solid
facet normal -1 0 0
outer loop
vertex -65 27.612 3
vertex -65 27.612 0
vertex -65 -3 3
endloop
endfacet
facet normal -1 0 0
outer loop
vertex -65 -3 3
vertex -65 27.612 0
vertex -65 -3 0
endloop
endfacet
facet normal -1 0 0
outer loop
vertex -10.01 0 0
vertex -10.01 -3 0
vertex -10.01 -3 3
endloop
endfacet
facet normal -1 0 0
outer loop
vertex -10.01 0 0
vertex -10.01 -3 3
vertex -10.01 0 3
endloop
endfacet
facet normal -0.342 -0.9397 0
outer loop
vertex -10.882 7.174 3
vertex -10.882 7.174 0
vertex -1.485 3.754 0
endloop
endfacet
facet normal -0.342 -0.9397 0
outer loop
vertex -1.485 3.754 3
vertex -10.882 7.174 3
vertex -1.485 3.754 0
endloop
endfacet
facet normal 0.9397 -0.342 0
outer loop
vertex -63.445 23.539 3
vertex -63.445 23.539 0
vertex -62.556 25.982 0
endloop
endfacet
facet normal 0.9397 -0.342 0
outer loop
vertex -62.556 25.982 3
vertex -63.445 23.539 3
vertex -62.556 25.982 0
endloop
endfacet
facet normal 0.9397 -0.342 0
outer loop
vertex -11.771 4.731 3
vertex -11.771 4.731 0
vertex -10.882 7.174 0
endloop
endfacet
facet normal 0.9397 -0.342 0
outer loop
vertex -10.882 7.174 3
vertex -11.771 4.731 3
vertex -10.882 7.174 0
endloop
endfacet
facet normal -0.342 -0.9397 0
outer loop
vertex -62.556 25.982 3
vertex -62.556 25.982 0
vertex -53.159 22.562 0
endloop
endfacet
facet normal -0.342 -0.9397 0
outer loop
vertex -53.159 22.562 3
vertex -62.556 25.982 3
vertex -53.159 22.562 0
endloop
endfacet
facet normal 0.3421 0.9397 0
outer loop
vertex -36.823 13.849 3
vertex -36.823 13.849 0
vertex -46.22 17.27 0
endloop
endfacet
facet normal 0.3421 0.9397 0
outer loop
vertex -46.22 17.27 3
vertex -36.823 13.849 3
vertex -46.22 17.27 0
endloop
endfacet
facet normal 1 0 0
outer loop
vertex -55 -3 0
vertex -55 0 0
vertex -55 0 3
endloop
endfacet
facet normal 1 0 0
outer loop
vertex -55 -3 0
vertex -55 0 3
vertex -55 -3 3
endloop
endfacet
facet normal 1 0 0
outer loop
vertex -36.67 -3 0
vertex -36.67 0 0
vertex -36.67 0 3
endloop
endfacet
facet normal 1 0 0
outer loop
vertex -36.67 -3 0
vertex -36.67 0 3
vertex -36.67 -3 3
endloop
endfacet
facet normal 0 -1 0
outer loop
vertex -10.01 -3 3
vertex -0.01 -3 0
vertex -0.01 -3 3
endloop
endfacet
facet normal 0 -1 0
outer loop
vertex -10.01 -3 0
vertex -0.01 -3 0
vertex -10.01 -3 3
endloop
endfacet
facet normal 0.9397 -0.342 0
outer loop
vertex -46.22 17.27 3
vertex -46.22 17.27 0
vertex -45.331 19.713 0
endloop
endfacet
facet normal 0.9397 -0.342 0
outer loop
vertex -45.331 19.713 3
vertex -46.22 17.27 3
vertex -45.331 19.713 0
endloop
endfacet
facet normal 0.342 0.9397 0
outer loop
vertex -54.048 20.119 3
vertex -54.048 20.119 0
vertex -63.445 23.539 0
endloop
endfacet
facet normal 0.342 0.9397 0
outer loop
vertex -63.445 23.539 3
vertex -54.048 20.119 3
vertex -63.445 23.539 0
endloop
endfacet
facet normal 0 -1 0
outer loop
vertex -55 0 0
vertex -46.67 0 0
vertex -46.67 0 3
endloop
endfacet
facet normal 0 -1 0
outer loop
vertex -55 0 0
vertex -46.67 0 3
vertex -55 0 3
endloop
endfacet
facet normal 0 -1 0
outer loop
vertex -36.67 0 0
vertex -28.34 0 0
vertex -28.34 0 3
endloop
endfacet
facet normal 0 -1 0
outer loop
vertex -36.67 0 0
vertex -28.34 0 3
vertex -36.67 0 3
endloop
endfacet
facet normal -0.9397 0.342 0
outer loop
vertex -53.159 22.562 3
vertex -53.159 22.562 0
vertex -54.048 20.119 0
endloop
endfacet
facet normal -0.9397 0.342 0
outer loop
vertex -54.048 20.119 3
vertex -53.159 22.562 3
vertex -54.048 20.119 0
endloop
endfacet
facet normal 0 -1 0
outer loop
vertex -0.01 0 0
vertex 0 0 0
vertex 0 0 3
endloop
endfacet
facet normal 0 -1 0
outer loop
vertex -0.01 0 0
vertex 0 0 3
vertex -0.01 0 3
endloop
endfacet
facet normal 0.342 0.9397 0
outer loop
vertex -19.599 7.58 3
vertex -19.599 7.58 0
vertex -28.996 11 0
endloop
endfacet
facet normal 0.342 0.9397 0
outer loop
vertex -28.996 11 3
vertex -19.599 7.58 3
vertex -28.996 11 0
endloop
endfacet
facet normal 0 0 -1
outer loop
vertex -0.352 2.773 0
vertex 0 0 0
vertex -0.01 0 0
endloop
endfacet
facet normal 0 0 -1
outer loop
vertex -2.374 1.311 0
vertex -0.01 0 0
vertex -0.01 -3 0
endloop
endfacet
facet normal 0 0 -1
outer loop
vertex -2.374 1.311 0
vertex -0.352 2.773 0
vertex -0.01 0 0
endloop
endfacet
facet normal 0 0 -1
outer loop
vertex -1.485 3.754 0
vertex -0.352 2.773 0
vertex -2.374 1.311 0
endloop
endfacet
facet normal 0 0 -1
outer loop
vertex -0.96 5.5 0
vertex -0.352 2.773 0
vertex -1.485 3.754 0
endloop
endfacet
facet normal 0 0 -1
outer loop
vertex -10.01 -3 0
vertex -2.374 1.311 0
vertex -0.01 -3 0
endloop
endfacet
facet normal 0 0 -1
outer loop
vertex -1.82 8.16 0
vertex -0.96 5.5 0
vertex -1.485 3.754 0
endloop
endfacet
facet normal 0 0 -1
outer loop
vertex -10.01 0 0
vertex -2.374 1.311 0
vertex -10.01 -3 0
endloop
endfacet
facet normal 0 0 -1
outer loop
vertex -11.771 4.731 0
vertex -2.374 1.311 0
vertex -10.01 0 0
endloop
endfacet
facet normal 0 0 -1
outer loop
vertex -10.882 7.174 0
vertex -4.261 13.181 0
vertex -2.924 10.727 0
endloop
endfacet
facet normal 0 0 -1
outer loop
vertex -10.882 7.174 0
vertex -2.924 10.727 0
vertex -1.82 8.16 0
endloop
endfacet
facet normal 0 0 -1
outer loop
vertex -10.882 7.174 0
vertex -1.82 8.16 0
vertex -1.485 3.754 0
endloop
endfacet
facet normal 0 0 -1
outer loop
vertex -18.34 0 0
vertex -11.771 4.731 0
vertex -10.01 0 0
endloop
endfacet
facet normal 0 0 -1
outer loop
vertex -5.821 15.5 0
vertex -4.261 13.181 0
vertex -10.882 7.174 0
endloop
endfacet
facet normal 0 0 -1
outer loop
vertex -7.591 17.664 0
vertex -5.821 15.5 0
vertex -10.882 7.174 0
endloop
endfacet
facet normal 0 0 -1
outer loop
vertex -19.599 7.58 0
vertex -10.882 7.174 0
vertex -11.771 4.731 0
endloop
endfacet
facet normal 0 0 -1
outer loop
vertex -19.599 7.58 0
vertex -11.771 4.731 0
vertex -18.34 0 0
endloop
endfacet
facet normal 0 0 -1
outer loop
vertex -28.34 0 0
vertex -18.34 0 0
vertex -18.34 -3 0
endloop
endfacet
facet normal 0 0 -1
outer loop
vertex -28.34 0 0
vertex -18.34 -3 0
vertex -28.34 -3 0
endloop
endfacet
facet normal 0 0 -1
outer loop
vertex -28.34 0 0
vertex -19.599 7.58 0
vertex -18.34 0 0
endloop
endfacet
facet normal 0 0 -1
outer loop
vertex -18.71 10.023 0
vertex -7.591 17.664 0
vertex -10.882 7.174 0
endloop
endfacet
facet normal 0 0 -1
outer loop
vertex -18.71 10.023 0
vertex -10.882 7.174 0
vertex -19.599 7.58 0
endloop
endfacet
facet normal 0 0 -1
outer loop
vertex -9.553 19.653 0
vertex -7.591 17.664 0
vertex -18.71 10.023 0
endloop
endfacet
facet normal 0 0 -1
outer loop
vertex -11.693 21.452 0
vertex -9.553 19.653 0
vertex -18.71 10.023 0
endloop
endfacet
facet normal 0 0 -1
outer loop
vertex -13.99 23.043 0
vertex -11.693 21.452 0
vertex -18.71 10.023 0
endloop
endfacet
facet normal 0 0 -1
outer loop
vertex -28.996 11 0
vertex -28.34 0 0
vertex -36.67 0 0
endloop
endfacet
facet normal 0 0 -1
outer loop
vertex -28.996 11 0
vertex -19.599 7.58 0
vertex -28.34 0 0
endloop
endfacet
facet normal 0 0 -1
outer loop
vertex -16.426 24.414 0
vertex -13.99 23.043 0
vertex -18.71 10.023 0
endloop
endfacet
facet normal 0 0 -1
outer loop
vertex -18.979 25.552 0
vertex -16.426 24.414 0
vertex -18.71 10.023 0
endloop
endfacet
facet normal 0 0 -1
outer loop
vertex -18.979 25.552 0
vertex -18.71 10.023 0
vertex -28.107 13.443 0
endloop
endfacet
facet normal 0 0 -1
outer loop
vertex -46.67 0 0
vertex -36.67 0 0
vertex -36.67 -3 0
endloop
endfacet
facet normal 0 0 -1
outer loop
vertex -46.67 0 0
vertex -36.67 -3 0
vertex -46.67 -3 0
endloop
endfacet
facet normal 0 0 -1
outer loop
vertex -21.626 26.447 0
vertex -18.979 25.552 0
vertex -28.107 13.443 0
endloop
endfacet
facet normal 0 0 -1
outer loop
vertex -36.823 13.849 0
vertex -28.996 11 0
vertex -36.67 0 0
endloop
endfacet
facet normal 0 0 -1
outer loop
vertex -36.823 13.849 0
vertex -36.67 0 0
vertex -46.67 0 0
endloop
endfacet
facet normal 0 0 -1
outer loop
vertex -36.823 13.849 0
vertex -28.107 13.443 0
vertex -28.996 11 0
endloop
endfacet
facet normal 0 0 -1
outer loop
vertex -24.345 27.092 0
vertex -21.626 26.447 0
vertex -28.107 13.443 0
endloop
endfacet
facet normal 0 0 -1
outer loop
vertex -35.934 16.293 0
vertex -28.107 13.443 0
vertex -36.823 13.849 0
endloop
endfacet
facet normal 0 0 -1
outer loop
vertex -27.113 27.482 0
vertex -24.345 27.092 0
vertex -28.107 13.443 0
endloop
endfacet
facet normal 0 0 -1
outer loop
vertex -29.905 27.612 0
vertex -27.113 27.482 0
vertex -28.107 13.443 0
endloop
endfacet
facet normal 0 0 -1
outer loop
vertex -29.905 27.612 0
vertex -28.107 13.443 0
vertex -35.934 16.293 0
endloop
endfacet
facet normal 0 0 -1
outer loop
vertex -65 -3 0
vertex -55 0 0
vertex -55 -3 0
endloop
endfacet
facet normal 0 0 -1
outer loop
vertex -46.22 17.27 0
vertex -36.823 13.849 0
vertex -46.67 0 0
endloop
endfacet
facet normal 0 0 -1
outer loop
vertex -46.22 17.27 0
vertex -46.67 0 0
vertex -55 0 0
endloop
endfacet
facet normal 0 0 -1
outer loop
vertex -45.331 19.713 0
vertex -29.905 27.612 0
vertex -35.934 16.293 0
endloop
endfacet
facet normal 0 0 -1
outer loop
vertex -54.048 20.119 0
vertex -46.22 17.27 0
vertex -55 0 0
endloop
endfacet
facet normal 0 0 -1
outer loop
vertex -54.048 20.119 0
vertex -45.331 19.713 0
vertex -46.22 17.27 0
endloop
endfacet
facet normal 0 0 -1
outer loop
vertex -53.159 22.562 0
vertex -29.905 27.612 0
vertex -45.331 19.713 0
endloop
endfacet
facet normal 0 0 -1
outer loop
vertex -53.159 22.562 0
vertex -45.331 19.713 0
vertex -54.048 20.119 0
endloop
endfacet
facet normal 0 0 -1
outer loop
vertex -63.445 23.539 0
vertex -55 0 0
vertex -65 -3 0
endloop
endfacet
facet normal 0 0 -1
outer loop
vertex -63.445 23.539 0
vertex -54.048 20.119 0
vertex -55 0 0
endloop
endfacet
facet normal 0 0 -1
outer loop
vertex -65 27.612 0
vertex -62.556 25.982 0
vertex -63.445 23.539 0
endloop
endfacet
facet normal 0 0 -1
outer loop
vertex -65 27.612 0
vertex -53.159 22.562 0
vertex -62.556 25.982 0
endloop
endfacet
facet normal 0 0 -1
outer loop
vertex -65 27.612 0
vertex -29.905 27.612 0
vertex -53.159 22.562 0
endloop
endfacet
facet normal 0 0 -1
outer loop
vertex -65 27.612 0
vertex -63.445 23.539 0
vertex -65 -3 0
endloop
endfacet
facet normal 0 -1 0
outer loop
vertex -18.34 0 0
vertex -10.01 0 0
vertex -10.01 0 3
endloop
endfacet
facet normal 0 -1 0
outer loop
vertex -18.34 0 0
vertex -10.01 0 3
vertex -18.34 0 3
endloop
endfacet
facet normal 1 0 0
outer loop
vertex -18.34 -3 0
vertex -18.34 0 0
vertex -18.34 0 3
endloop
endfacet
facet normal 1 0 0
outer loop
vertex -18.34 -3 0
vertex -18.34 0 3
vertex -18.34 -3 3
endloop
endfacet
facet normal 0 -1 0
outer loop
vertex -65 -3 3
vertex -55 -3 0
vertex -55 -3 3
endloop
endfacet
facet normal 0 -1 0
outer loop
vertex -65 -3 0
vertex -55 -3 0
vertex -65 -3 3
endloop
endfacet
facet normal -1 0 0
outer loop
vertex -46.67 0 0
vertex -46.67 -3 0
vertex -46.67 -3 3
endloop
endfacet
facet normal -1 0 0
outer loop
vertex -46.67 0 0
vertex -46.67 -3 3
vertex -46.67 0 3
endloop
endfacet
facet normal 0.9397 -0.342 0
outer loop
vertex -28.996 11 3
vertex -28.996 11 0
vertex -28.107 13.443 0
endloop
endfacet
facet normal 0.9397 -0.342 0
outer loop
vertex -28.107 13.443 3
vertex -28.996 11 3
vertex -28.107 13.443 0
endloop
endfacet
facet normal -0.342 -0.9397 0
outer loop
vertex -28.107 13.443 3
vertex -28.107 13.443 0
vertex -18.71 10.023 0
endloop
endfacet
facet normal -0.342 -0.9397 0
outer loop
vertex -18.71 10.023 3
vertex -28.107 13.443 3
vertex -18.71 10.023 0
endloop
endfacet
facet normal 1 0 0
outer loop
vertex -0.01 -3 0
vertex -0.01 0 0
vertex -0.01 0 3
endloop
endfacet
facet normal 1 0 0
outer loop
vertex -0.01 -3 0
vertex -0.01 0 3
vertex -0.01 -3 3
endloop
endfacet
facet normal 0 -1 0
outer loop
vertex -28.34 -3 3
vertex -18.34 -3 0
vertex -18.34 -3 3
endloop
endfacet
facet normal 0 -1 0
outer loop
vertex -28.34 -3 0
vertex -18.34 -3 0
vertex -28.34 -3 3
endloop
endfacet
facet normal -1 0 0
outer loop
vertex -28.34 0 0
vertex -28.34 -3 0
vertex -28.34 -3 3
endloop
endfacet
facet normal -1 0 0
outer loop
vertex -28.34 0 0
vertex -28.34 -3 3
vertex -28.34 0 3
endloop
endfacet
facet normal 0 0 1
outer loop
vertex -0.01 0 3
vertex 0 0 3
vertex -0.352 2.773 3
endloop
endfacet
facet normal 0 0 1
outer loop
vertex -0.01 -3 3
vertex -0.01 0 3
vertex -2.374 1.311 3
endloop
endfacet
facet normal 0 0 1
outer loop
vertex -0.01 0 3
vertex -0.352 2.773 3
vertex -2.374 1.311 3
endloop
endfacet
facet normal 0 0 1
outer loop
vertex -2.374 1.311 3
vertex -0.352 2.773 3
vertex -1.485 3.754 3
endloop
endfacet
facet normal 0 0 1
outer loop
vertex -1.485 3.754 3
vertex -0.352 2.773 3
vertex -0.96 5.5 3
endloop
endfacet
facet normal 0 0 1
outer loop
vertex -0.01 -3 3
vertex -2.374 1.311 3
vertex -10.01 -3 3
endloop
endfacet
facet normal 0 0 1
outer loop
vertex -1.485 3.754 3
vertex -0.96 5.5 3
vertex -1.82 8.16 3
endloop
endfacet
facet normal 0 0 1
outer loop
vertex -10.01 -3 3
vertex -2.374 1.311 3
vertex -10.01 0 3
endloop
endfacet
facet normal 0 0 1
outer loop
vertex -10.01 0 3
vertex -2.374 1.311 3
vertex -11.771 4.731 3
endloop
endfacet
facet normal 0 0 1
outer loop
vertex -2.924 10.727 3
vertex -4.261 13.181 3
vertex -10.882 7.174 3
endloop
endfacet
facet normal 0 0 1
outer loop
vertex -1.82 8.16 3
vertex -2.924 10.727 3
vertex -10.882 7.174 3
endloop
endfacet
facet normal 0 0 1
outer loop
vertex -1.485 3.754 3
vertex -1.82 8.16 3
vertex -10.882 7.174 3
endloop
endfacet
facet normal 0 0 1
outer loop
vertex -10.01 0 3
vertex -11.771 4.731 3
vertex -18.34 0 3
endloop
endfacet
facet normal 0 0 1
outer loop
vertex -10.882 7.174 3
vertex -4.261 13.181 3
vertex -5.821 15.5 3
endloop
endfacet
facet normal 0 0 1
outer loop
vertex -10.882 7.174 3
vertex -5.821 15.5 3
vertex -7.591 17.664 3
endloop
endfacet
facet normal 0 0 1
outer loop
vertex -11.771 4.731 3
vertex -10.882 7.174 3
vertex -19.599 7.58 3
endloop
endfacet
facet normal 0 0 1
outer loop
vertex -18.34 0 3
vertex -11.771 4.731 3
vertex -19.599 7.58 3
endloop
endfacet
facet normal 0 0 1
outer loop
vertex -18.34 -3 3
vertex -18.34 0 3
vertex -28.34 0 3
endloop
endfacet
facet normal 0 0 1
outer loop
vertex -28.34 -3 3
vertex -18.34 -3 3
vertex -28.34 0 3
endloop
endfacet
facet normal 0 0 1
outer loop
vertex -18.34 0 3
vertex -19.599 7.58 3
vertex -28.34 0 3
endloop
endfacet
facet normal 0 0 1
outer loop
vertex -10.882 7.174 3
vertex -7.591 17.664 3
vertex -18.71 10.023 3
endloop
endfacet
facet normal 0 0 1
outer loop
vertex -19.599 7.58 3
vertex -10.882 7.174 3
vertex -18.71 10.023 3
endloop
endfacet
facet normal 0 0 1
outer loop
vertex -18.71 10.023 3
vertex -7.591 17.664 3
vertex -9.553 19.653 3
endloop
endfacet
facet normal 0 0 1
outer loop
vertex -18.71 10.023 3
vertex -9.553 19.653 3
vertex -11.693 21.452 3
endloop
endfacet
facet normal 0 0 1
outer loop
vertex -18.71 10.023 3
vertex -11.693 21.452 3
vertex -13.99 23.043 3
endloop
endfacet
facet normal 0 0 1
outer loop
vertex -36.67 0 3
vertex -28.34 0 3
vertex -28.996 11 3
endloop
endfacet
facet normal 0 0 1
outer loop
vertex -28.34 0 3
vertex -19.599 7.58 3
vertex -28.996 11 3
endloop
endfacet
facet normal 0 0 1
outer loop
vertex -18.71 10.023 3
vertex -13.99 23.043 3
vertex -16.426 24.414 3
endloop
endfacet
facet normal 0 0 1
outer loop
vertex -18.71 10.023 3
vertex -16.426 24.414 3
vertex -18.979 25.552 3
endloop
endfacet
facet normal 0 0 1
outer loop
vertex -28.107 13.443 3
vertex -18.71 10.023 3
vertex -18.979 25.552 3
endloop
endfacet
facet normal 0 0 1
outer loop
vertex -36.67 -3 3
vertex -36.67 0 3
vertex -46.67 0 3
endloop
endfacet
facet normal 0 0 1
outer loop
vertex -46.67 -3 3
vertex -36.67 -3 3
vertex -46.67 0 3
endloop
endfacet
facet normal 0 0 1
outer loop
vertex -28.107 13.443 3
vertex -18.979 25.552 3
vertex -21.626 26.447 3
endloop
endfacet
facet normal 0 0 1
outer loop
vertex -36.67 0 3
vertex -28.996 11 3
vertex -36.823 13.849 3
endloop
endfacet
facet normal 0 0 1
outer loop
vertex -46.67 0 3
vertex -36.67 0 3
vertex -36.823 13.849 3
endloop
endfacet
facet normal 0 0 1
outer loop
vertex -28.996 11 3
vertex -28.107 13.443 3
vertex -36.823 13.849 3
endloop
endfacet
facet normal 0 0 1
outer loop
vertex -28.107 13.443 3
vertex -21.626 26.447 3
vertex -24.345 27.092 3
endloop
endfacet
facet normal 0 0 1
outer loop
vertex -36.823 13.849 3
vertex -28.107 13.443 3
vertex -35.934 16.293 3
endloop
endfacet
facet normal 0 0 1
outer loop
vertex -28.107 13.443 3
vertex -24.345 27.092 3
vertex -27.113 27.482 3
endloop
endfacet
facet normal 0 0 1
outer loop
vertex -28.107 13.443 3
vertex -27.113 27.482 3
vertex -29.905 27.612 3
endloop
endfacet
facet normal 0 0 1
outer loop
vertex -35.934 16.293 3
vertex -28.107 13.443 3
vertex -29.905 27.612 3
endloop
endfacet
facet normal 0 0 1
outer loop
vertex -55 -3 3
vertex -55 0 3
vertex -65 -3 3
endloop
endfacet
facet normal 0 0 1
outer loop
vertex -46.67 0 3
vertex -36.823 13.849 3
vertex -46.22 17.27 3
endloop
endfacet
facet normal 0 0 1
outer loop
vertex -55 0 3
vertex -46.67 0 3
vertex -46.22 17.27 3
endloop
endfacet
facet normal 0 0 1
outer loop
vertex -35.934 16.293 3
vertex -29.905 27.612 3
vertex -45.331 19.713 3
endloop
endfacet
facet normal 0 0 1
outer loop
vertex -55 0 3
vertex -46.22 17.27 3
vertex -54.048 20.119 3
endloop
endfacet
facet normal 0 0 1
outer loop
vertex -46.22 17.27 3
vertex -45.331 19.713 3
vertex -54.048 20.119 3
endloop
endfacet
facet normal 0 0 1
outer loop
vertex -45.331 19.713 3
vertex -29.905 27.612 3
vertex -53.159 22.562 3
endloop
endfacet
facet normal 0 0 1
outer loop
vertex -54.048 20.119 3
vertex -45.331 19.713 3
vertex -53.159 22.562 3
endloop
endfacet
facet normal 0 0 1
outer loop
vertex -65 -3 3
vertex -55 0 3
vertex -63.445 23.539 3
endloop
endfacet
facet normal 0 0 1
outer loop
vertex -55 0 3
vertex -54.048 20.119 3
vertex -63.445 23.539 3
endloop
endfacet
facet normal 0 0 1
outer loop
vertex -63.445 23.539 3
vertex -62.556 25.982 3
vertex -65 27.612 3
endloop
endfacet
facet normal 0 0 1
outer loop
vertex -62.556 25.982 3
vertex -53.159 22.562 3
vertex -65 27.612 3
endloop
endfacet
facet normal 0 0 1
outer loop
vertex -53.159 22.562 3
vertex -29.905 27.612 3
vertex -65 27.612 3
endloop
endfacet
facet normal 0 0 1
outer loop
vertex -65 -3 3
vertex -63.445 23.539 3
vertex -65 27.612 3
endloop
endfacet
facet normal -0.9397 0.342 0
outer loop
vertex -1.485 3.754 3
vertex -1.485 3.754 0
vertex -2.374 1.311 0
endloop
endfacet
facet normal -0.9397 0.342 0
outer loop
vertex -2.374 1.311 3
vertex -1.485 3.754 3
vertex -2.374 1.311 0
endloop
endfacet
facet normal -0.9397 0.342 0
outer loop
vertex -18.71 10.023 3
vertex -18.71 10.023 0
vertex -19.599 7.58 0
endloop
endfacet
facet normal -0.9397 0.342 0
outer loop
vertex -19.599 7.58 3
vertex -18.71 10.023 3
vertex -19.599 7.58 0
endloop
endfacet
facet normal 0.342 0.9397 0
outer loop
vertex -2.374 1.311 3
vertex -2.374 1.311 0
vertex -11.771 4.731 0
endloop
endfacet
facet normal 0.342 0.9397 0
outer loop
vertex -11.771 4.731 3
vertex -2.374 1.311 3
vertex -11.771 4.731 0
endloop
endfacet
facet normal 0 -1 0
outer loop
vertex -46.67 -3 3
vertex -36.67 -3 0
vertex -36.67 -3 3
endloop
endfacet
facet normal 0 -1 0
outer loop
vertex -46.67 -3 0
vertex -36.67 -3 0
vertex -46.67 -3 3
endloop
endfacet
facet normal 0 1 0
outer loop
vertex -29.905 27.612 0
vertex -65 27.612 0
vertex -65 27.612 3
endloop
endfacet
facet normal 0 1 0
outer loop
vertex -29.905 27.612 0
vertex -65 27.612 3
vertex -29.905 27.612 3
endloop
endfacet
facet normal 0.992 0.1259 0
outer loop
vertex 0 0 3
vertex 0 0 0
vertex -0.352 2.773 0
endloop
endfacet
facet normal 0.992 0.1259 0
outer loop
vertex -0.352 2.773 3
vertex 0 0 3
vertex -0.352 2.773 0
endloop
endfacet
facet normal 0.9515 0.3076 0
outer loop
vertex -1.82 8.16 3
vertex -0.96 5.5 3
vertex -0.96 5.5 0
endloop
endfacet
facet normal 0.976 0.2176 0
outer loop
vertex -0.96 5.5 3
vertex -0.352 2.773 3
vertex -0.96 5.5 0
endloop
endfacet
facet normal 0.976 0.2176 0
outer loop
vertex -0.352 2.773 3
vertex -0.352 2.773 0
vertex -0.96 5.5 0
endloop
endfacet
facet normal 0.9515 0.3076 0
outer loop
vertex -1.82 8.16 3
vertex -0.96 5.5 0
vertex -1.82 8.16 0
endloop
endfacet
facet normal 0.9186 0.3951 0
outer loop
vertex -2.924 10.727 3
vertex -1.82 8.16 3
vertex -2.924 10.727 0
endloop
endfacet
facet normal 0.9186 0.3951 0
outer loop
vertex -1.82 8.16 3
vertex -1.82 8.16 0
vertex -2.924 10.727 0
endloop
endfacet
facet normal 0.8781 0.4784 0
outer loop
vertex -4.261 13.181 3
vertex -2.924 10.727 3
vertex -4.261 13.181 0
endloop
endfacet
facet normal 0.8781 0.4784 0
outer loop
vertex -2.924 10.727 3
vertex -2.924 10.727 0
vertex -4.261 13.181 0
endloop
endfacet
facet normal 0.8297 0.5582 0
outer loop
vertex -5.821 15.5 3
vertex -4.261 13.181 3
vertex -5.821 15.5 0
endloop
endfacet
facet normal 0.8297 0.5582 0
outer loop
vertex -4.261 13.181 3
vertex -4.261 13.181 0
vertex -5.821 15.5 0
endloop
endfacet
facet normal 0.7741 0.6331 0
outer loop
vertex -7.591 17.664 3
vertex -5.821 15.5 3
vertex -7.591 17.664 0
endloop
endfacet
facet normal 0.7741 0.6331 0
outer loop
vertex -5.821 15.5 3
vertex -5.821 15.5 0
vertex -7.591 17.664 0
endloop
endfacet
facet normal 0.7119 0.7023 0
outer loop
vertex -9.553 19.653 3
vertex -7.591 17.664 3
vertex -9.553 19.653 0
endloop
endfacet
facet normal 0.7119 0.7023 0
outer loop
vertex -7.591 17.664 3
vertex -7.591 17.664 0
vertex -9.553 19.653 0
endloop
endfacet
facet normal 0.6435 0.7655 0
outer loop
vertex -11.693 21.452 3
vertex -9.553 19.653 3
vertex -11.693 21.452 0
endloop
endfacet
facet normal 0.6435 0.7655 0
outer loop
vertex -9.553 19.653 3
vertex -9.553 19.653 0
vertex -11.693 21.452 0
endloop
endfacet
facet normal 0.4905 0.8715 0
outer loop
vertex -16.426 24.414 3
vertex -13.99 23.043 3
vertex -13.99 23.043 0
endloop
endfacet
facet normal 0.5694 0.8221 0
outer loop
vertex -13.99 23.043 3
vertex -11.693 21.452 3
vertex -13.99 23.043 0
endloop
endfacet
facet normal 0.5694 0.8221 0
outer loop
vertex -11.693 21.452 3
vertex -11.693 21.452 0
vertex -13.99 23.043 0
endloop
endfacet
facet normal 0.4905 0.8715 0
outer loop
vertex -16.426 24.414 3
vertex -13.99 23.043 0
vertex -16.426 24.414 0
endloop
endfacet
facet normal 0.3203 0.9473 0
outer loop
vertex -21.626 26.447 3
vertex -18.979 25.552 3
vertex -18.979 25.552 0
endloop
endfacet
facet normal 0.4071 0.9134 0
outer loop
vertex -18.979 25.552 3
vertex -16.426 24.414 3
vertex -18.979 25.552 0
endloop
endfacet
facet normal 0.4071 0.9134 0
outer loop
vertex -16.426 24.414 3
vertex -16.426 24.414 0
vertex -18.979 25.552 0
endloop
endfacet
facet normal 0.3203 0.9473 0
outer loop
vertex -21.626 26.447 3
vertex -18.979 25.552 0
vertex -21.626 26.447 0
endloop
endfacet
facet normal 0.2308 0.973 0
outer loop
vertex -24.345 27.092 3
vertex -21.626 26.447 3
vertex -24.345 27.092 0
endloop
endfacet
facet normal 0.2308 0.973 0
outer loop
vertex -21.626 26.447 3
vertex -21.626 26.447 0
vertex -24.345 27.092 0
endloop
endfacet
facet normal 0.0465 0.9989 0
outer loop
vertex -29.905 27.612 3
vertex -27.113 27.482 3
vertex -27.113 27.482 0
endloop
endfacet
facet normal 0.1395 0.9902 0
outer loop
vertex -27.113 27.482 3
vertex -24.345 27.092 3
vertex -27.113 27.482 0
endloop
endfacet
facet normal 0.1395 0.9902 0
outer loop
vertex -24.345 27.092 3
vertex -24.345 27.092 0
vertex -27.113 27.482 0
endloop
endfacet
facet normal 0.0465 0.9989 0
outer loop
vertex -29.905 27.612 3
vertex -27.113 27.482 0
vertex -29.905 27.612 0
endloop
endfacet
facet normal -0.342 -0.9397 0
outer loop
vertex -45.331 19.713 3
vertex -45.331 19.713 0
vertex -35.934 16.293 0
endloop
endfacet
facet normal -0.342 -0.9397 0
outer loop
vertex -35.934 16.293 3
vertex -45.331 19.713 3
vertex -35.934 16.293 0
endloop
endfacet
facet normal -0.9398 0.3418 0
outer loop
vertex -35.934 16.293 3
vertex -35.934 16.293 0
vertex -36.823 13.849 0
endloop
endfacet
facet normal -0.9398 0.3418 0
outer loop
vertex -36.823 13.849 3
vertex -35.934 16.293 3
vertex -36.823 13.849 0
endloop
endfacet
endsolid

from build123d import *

# Parameters (mm, degrees)
BOSS_EXTRUDE1_DEPTH = 3
FILLET1_R           = 30


with BuildPart() as part:
    # Sketch1 → Boss-Extrude1 (new body)
    with BuildSketch(Plane.XY):
        Polygon((0, 0), (-0.01, 0), (-0.01, -3), (-10.01, -3), (-10.01, 0), (-18.34, 0), (-18.34, -3), (-28.34, -3), (-28.34, 0), (-36.67, 0), (-36.67, -3), (-46.67, -3), (-46.67, 0), (-55, 0), (-55, -3), (-65, -3), (-65, 0), (-65, 27.612062293), (0, 27.612062293), align=None)
        Polygon((-63.444972674, 23.538741566), (-62.555720301, 25.98194238), (-53.158794094, 22.561740947), (-54.048046466, 20.118540133), align=None, mode=Mode.SUBTRACT)
        Polygon((-45.331154562, 19.712713153), (-35.934228355, 16.29251172), (-36.823480727, 13.849310906), (-46.220406935, 17.269512339), align=None, mode=Mode.SUBTRACT)
        Polygon((-28.106588823, 13.443483926), (-18.709662616, 10.023282493), (-19.598914988, 7.580081679), (-28.995841196, 11.000283112), align=None, mode=Mode.SUBTRACT)
        Polygon((-10.882023084, 7.174254699), (-1.485096877, 3.754053266), (-2.374349249, 1.310852452), (-11.771275457, 4.731053885), align=None, mode=Mode.SUBTRACT)
    extrude(amount=BOSS_EXTRUDE1_DEPTH)

    # Fillet1
    # the kernel refuses this fillet: 30 mm, written as the material it takes off along each edge
    with BuildSketch(Plane(origin=(0, 27.612062293, -74.762028861), x_dir=(-1, 0, 0), z_dir=(0, 0, 1))) as fillet1_piece_1:
        with BuildLine():
            CenterArc((29.904811544, 30), FILLET1_R, 184.565454752, 85.434545248)
            Line((0, 27.612062293), (-0.598096231, 27.564303539))
            ThreePointArc((-0.598096231, 27.564303539), (-0.6, 13.806031146), (-0.6, 0))
            Line((-0.6, 0), (0, -0.6))
            Line((0, -0.6), (29.904811544, -0.6))
            Line((29.904811544, -0.6), (29.904811544, 0))
        make_face()
    extrude(amount=152.524057722, mode=Mode.SUBTRACT)


solid = part.part
